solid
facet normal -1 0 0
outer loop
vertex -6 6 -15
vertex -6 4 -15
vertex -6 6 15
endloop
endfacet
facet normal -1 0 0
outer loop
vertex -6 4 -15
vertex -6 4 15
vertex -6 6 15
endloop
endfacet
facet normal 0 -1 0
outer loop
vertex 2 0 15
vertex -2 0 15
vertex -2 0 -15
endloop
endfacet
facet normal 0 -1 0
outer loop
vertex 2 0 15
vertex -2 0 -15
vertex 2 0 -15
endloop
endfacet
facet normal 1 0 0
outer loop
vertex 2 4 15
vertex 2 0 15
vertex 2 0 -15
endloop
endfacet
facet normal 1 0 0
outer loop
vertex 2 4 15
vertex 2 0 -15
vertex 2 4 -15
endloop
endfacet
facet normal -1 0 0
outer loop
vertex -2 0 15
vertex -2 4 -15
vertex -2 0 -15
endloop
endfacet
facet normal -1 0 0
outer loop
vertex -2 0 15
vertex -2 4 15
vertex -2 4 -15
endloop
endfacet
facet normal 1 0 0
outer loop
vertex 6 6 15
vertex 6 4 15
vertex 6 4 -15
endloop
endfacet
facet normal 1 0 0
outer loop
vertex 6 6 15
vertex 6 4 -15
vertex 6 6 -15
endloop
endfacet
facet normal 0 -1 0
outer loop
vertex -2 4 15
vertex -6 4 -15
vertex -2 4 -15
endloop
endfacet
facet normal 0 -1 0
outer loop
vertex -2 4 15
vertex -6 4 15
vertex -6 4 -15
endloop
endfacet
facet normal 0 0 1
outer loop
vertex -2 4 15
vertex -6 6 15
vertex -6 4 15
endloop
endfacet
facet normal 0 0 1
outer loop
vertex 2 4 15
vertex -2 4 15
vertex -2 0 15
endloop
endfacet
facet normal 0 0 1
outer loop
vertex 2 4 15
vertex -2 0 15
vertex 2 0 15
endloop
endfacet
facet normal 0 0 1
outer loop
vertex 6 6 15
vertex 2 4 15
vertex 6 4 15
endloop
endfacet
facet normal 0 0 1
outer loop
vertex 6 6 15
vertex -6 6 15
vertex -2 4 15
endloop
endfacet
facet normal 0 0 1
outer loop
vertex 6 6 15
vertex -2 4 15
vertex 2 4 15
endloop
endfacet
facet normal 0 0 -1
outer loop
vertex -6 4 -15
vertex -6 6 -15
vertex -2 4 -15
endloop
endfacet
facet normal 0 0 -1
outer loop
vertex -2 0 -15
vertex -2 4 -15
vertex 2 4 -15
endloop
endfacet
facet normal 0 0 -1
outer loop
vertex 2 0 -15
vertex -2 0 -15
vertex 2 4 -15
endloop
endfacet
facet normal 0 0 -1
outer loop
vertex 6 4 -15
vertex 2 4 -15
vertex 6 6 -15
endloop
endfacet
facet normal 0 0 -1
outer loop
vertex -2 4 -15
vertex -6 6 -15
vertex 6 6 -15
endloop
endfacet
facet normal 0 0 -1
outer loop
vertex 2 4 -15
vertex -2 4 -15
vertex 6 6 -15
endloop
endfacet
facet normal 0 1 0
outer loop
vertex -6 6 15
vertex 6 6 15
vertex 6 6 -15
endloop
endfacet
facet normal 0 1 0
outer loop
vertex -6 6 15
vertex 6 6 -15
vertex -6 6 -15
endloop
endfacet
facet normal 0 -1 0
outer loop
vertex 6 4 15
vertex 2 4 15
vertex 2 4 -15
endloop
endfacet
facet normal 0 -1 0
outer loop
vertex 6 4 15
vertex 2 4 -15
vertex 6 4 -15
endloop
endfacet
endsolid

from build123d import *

# Parameters (mm, degrees)
F0_W     = 2
F0_H     = 2
F0_W_2   = 4
F1_DEPTH = 15


with BuildPart() as f1:
    # F0 (on Top) → F1 (new body, symmetric)
    with BuildSketch(Plane.XY):
        with Locations((-1, 5)):
            Rectangle(F0_W, F0_H)
        with Locations((1, 5)):
            Rectangle(F0_W, F0_H)
        with Locations((4, 5)):
            Rectangle(F0_W_2, F0_H)
        Polygon((-2, 4), (-2, 0), (2, 0), (2, 4), (0, 4), align=None)
        with Locations((-4, 5)):
            Rectangle(F0_W_2, F0_H)
    extrude(amount=F1_DEPTH, both=True)


solid = f1.part
